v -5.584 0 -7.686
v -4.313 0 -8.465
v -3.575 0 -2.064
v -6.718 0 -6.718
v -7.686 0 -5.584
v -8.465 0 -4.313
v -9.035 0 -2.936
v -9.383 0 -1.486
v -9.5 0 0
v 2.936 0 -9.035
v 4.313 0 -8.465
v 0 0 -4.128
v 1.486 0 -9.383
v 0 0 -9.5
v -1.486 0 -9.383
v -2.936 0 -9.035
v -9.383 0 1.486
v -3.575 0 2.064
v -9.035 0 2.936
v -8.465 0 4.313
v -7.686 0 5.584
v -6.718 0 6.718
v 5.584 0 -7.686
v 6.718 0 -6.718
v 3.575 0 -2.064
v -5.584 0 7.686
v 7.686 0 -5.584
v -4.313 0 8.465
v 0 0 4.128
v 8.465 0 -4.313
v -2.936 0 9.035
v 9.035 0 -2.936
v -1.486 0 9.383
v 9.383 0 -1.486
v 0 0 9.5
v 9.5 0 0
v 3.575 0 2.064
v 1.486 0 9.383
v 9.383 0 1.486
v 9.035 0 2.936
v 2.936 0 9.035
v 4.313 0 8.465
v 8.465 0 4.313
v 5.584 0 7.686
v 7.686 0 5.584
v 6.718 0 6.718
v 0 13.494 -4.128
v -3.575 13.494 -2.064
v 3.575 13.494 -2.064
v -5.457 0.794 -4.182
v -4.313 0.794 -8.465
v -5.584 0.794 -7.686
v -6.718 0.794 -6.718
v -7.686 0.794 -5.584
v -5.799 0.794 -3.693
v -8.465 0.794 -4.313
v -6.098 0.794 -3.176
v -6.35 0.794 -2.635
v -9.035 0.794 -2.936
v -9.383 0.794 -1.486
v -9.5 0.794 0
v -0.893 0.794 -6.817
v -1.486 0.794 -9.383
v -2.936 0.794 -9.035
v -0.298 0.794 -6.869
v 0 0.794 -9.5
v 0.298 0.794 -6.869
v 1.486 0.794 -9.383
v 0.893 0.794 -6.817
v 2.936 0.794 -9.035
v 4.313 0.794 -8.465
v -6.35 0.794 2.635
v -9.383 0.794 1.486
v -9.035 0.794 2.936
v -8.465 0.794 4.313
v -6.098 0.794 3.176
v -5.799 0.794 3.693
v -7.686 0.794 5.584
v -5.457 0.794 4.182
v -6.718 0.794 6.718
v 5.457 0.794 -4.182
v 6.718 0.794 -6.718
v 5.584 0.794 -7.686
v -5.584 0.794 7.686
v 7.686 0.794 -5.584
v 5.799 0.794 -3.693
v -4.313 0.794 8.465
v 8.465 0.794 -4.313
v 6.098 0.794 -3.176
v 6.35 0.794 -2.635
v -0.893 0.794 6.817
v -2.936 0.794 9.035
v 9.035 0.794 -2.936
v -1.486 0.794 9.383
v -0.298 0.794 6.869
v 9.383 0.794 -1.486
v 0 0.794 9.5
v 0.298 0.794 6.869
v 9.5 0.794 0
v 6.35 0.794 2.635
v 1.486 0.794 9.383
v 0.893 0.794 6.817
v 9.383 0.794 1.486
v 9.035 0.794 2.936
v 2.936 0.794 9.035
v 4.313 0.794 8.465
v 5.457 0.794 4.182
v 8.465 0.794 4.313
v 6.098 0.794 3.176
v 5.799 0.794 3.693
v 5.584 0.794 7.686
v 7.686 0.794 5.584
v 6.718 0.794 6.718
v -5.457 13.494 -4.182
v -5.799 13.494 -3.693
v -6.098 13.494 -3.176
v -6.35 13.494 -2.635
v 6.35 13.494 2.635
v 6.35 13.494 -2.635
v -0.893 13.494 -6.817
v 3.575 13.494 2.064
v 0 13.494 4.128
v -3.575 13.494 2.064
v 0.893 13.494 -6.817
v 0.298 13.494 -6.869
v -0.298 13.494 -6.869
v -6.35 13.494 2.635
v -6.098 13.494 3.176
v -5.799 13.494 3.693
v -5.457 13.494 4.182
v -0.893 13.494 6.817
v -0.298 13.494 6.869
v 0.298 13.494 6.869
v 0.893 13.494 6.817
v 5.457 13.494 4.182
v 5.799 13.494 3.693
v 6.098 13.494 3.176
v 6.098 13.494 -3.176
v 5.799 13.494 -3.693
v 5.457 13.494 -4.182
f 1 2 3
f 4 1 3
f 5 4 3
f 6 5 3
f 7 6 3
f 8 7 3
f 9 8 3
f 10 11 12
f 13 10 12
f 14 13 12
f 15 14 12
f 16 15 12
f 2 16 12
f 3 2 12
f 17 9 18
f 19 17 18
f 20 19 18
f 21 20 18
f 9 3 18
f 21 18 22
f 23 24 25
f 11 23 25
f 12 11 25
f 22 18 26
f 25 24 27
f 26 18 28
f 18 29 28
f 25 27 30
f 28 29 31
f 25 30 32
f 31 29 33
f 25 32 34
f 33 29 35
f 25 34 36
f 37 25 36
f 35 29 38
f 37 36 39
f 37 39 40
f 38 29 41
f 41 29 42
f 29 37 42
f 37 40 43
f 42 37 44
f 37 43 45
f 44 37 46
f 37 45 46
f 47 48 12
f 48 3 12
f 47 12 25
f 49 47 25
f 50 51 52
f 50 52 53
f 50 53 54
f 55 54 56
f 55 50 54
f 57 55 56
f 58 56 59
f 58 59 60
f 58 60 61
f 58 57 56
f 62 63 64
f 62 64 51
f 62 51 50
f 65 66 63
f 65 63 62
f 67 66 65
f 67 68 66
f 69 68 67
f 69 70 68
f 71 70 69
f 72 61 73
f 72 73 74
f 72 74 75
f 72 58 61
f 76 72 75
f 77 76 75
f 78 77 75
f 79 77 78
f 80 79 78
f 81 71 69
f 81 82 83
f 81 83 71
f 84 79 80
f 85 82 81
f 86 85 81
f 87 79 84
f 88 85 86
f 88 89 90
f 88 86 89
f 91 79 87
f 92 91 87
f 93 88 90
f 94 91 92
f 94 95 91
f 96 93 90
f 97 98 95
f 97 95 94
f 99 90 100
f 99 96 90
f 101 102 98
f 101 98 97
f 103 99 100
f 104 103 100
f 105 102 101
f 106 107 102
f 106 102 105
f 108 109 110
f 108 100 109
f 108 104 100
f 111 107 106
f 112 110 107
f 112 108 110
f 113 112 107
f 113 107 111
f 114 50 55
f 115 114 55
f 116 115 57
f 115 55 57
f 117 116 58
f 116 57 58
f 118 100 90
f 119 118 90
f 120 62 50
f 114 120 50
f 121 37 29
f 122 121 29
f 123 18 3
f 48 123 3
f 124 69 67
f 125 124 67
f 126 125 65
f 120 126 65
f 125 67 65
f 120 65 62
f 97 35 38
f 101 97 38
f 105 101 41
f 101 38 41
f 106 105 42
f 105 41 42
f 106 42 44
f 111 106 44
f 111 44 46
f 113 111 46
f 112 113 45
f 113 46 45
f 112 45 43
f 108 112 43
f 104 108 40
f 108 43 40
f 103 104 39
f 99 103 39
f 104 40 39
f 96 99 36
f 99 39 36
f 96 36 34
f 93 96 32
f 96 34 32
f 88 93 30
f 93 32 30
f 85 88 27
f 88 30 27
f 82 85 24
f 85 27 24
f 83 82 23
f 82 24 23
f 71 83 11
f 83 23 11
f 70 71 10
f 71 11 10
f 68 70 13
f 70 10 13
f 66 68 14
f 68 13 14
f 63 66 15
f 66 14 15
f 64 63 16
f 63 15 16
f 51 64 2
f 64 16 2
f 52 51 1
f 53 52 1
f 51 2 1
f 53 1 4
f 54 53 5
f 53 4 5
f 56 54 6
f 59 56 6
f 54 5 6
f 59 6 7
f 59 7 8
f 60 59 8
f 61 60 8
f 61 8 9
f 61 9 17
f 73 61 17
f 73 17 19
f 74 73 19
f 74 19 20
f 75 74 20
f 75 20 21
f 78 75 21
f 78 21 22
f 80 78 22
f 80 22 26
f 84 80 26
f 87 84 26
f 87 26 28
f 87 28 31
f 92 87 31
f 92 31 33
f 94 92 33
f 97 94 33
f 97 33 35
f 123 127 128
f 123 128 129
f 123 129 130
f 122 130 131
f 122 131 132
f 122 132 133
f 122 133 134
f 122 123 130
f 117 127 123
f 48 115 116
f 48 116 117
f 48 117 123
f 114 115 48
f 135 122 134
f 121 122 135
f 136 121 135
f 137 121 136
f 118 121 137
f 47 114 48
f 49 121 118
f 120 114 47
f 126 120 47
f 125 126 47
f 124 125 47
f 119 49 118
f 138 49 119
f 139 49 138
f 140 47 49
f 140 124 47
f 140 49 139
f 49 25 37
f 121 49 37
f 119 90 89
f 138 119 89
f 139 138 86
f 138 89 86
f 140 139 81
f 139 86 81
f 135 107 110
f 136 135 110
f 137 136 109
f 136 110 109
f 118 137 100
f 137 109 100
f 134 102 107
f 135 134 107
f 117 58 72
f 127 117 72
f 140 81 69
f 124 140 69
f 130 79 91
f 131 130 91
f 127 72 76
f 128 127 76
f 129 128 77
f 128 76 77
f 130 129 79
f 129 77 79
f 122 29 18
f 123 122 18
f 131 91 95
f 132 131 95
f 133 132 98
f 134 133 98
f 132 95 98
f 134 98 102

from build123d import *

# Parameters (mm, degrees)
SKETCH1_R           = 9.5
BOSS_EXTRUDE1_DEPTH = 0.79375
BOSS_EXTRUDE2_DEPTH = 12.7


with BuildPart() as part:
    # Sketch1 → Boss-Extrude1 (new body)
    with BuildSketch(Plane(origin=(0, 0, 0), x_dir=(1, 0, 0), z_dir=(0, 1, 0))):
        with Locations(Location((0, 0, 0), (0, 0, 270))):
            Circle(SKETCH1_R)
        Polygon((0, 4.128054425), (-3.575, 2.064027212), (-3.575, -2.064027212), (0, -4.128054425), (3.575, -2.064027212), (3.575, 2.064027212), align=None, mode=Mode.SUBTRACT)
    extrude(amount=BOSS_EXTRUDE1_DEPTH)

    # Sketch2 → Boss-Extrude2 (add)
    with BuildSketch(Plane(origin=(0, 0.79375, 0), x_dir=(1, 0, 0), z_dir=(0, 1, 0))):
        with BuildLine():
            ThreePointArc((0.893039494, 6.816751826), (0, 6.875), (-0.893039494, 6.816751826))
            Line((-0.893039494, 6.816751826), (-5.456960506, 4.181770802))
            ThreePointArc((-5.456960506, 4.181770802), (-5.953924651, 3.4375), (-6.35, 2.634981025))
            Line((-6.35, 2.634981025), (-6.35, -2.634981025))
            ThreePointArc((-6.35, -2.634981025), (-5.953924651, -3.4375), (-5.456960506, -4.181770802))
            Line((-5.456960506, -4.181770802), (-0.893039494, -6.816751826))
            ThreePointArc((-0.893039494, -6.816751826), (0, -6.875), (0.893039494, -6.816751826))
            Line((0.893039494, -6.816751826), (5.456960506, -4.181770802))
            ThreePointArc((5.456960506, -4.181770802), (5.953924651, -3.4375), (6.35, -2.634981025))
            Line((6.35, -2.634981025), (6.35, 2.634981025))
            ThreePointArc((6.35, 2.634981025), (5.953924651, 3.4375), (5.456960506, 4.181770802))
            Line((5.456960506, 4.181770802), (0.893039494, 6.816751826))
        make_face()
        Polygon((-3.575, 2.064027212), (0, 4.128054425), (3.575, 2.064027212), (3.575, -2.064027212), (0, -4.128054425), (-3.575, -2.064027212), align=None, mode=Mode.SUBTRACT)
    extrude(amount=BOSS_EXTRUDE2_DEPTH)


solid = part.part
